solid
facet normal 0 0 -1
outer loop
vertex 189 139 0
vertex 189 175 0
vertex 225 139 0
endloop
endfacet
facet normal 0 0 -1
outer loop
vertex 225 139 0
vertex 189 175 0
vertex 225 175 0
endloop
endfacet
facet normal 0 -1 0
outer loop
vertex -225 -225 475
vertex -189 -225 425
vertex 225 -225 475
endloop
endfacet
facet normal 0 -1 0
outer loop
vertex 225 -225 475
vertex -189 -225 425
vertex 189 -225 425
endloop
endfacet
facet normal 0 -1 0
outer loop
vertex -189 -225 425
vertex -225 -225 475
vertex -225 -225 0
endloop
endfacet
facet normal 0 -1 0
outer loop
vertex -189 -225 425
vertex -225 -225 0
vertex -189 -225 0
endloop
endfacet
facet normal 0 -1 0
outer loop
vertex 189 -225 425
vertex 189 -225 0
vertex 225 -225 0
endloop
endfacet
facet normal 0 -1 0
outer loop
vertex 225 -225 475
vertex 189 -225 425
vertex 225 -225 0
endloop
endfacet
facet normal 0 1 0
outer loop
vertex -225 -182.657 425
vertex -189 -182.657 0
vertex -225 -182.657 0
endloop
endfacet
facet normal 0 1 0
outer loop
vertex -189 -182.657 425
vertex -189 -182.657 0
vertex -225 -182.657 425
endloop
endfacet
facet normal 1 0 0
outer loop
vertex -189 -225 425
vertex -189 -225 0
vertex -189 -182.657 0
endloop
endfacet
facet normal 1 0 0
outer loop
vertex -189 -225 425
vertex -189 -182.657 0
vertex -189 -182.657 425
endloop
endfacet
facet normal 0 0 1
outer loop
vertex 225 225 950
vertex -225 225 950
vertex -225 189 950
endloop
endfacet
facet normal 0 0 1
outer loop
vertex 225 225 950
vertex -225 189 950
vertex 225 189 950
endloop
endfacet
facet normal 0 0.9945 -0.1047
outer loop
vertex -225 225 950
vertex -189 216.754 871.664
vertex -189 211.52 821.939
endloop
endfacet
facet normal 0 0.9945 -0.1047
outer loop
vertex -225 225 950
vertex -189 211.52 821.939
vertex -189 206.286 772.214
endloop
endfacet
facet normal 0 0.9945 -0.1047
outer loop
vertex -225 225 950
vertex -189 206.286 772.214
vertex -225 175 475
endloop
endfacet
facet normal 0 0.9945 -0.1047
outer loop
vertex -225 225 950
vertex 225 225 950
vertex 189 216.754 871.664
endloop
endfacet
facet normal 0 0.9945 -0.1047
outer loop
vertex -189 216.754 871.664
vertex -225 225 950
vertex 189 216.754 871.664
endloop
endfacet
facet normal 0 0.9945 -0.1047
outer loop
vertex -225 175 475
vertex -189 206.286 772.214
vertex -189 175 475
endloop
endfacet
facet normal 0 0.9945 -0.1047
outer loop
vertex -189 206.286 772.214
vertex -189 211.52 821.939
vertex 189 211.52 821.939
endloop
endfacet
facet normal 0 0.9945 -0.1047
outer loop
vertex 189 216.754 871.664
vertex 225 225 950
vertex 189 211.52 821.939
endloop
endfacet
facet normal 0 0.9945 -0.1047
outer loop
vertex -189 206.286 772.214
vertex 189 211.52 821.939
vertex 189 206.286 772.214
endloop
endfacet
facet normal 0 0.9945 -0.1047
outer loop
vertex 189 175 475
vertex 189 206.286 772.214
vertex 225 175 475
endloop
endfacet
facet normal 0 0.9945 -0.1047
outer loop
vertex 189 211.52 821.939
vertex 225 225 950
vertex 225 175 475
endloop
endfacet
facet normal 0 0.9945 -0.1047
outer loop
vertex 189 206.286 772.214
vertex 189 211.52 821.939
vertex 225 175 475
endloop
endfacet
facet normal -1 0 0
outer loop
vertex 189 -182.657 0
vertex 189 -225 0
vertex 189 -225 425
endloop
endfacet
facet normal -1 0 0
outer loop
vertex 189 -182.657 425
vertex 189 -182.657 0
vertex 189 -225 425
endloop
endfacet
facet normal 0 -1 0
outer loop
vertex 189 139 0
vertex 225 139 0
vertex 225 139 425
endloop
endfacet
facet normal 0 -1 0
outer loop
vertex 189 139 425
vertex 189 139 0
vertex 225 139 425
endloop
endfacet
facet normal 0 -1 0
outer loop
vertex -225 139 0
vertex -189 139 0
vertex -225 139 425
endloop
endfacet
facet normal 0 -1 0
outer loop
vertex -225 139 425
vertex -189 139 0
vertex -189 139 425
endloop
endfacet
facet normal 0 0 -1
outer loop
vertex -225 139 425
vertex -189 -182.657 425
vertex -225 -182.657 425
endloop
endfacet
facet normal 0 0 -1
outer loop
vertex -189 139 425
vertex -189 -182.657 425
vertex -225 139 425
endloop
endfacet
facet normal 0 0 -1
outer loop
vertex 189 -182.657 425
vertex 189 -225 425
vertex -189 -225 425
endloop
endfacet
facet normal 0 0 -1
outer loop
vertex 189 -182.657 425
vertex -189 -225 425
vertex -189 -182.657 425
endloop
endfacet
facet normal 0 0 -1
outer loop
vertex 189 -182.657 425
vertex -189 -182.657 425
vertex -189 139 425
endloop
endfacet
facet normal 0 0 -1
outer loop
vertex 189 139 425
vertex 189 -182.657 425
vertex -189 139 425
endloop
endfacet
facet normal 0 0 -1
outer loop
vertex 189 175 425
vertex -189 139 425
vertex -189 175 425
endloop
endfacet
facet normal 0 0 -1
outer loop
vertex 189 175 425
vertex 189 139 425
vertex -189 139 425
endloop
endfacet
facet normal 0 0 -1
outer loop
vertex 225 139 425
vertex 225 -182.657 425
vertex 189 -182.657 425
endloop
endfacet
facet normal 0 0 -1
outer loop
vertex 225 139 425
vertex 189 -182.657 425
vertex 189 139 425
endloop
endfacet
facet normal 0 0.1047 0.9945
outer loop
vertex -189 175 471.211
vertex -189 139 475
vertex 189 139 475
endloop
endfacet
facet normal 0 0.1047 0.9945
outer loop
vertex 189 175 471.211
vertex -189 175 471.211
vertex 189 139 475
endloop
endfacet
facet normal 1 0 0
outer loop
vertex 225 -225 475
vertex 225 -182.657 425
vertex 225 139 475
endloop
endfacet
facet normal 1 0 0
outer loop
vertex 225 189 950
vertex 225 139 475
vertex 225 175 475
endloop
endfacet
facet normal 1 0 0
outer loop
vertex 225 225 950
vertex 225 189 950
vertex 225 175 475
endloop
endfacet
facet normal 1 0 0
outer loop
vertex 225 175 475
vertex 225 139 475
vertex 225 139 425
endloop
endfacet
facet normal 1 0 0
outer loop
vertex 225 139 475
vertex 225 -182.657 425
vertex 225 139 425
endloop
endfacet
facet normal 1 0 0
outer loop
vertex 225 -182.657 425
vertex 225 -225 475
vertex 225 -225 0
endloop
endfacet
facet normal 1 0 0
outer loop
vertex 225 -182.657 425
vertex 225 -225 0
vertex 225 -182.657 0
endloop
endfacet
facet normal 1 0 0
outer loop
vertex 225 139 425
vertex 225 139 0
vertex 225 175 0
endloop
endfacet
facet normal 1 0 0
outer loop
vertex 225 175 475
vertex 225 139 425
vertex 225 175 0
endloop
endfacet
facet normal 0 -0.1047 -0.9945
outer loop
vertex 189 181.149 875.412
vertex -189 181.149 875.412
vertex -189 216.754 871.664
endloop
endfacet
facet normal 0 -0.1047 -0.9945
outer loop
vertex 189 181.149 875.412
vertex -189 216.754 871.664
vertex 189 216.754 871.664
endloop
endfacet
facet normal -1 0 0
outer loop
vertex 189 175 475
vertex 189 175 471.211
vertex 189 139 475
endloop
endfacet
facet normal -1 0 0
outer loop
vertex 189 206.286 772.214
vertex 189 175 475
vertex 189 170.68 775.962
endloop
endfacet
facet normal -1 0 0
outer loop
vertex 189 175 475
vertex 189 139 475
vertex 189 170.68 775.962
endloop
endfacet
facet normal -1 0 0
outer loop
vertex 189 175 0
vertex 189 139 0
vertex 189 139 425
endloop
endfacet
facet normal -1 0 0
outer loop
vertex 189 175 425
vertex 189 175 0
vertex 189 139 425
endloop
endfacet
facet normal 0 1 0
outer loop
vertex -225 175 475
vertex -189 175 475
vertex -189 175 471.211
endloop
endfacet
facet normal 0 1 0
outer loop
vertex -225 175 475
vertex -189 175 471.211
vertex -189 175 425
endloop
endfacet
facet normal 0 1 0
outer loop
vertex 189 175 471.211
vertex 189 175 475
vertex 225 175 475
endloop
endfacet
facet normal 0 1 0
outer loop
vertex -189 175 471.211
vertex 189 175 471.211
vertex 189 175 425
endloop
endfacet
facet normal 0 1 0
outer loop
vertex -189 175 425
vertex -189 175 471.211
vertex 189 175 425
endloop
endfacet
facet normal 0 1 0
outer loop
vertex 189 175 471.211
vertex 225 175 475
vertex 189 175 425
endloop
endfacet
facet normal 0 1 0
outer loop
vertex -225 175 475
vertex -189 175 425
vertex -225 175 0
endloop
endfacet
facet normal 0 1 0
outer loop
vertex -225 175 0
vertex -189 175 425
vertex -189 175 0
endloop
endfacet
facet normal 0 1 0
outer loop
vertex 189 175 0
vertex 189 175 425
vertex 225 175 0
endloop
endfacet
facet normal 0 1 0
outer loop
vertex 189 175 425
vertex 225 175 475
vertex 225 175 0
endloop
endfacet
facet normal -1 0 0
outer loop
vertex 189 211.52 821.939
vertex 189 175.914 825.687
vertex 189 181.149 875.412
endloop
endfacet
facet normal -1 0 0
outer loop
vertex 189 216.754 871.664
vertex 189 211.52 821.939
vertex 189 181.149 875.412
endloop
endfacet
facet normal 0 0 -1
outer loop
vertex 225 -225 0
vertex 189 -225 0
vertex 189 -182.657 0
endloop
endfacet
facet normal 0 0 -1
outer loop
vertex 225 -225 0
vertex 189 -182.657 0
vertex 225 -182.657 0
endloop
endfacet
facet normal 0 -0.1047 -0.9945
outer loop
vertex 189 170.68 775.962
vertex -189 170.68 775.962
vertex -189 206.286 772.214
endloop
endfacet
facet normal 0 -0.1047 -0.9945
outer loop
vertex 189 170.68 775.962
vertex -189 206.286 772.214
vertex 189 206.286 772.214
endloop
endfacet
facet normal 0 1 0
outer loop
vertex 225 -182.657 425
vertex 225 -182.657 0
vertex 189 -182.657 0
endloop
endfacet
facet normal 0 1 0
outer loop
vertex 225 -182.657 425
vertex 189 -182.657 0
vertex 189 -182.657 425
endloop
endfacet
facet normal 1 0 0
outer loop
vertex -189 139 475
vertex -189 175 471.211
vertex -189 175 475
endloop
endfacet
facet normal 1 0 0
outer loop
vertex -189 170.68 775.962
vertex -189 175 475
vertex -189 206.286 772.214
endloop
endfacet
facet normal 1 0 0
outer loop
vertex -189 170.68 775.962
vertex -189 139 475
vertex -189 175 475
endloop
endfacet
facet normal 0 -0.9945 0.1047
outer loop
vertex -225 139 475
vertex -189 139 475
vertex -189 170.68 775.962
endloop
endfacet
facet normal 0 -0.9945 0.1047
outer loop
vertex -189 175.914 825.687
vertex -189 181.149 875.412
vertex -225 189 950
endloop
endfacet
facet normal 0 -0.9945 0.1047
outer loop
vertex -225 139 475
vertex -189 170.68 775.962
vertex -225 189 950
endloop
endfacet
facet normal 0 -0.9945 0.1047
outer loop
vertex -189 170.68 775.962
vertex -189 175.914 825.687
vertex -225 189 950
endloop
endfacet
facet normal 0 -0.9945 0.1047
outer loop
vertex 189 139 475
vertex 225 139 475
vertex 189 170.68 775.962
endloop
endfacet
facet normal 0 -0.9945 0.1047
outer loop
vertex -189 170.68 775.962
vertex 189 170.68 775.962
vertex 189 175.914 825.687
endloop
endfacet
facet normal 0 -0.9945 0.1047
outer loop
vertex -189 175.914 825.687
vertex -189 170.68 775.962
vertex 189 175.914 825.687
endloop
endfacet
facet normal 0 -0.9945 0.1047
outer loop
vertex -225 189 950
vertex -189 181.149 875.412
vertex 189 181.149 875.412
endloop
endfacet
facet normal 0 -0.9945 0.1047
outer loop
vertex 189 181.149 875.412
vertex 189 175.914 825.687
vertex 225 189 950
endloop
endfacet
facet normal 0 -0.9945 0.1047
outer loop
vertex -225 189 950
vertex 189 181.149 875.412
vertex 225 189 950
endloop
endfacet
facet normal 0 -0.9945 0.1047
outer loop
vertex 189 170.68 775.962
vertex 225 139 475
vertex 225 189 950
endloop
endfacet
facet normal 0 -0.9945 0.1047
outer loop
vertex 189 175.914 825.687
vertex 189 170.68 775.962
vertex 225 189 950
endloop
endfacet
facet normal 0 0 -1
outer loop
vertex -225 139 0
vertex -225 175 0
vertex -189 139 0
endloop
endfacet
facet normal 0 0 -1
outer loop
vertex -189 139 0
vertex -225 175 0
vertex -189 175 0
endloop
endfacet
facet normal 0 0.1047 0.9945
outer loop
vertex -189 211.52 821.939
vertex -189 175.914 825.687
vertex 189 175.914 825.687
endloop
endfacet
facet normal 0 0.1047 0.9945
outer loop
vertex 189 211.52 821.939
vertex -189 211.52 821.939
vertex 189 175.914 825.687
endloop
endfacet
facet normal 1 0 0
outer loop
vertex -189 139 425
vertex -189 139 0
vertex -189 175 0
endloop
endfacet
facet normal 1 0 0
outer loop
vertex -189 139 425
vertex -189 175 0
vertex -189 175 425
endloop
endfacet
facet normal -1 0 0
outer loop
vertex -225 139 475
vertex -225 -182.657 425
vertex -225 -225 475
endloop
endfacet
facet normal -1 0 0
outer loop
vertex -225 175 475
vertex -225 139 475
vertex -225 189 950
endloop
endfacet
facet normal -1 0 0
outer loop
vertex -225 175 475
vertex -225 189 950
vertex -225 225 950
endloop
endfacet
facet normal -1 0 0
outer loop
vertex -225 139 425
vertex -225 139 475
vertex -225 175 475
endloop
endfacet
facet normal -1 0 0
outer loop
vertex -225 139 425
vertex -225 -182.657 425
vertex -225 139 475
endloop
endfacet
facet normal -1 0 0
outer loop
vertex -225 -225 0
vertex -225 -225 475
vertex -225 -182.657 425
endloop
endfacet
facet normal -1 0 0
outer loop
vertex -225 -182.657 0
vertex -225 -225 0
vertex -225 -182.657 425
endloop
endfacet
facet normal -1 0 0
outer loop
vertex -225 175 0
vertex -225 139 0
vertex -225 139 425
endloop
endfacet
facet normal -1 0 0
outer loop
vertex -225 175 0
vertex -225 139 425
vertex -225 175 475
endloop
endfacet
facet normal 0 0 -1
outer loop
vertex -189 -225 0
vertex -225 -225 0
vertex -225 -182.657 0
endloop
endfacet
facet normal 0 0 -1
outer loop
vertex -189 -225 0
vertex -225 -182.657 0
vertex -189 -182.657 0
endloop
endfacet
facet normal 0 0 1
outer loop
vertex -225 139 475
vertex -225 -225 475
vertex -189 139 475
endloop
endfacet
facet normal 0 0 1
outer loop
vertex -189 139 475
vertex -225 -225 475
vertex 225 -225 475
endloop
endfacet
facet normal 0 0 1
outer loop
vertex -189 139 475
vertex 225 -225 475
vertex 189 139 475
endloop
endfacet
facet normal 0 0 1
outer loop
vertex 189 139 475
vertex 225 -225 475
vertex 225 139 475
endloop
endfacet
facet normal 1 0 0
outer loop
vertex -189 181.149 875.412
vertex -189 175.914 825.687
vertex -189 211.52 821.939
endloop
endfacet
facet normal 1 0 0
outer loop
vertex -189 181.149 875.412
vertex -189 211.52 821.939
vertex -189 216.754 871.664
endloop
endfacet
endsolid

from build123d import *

# Parameters (mm, degrees)
F0_W     = 450
F0_H     = 450
F1_DEPTH = 950
F2_W     = 50
F2_H     = 50
F2_W_2   = 321.6566308737
F2_H_2   = 425
F3_DEPTH = 450.001
F4_W     = 378
F4_H     = 425
F5_DEPTH = 450.001
F6_W     = 378
F6_H     = 50
F6_H_2   = 302.6243293636
F7_DEPTH = 135.2537415973


with BuildPart() as f1:
    # F0 (on Top) → F1 (new body)
    with BuildSketch(Plane.XY):
        Rectangle(F0_W, F0_H)
    extrude(amount=F1_DEPTH)

    # F2 (on face) → F3 (cut, through all)
    with BuildSketch(Plane.YZ.offset(225)):
        with Locations((200, 450)):
            Rectangle(F2_W, F2_H)
        Polygon((-182.6566308737, 475), (139, 475), (189, 950), (-225, 950), (-225, 475), align=None)
        with Locations((-21.8283154368, 212.5)):
            Rectangle(F2_W_2, F2_H_2)
        with Locations((200, 212.5)):
            Rectangle(F2_W, F2_H_2)
        Polygon((175, 475), (225, 475), (225, 950), align=None)
    extrude(amount=-F3_DEPTH, mode=Mode.SUBTRACT)

    # F4 (on face) → F5 (cut, through all)
    with BuildSketch(Plane.XZ.offset(225)):
        with Locations((0, 212.5)):
            Rectangle(F4_W, F4_H)
    extrude(amount=-F5_DEPTH, mode=Mode.SUBTRACT)

    # F6 (on face) → F7 (cut, through all)
    with BuildSketch(Plane(origin=(0, 88.0246575342, -9.2657534247), x_dir=(1, 0, 0), z_dir=(0, -0.9945054529, 0.1046847845))):
        with Locations((0, 864.5656045492)):
            Rectangle(F6_W, F6_H)
        with Locations((0, 638.2534398675)):
            Rectangle(F6_W, F6_H_2)
    extrude(amount=-F7_DEPTH, mode=Mode.SUBTRACT)


solid = f1.part
